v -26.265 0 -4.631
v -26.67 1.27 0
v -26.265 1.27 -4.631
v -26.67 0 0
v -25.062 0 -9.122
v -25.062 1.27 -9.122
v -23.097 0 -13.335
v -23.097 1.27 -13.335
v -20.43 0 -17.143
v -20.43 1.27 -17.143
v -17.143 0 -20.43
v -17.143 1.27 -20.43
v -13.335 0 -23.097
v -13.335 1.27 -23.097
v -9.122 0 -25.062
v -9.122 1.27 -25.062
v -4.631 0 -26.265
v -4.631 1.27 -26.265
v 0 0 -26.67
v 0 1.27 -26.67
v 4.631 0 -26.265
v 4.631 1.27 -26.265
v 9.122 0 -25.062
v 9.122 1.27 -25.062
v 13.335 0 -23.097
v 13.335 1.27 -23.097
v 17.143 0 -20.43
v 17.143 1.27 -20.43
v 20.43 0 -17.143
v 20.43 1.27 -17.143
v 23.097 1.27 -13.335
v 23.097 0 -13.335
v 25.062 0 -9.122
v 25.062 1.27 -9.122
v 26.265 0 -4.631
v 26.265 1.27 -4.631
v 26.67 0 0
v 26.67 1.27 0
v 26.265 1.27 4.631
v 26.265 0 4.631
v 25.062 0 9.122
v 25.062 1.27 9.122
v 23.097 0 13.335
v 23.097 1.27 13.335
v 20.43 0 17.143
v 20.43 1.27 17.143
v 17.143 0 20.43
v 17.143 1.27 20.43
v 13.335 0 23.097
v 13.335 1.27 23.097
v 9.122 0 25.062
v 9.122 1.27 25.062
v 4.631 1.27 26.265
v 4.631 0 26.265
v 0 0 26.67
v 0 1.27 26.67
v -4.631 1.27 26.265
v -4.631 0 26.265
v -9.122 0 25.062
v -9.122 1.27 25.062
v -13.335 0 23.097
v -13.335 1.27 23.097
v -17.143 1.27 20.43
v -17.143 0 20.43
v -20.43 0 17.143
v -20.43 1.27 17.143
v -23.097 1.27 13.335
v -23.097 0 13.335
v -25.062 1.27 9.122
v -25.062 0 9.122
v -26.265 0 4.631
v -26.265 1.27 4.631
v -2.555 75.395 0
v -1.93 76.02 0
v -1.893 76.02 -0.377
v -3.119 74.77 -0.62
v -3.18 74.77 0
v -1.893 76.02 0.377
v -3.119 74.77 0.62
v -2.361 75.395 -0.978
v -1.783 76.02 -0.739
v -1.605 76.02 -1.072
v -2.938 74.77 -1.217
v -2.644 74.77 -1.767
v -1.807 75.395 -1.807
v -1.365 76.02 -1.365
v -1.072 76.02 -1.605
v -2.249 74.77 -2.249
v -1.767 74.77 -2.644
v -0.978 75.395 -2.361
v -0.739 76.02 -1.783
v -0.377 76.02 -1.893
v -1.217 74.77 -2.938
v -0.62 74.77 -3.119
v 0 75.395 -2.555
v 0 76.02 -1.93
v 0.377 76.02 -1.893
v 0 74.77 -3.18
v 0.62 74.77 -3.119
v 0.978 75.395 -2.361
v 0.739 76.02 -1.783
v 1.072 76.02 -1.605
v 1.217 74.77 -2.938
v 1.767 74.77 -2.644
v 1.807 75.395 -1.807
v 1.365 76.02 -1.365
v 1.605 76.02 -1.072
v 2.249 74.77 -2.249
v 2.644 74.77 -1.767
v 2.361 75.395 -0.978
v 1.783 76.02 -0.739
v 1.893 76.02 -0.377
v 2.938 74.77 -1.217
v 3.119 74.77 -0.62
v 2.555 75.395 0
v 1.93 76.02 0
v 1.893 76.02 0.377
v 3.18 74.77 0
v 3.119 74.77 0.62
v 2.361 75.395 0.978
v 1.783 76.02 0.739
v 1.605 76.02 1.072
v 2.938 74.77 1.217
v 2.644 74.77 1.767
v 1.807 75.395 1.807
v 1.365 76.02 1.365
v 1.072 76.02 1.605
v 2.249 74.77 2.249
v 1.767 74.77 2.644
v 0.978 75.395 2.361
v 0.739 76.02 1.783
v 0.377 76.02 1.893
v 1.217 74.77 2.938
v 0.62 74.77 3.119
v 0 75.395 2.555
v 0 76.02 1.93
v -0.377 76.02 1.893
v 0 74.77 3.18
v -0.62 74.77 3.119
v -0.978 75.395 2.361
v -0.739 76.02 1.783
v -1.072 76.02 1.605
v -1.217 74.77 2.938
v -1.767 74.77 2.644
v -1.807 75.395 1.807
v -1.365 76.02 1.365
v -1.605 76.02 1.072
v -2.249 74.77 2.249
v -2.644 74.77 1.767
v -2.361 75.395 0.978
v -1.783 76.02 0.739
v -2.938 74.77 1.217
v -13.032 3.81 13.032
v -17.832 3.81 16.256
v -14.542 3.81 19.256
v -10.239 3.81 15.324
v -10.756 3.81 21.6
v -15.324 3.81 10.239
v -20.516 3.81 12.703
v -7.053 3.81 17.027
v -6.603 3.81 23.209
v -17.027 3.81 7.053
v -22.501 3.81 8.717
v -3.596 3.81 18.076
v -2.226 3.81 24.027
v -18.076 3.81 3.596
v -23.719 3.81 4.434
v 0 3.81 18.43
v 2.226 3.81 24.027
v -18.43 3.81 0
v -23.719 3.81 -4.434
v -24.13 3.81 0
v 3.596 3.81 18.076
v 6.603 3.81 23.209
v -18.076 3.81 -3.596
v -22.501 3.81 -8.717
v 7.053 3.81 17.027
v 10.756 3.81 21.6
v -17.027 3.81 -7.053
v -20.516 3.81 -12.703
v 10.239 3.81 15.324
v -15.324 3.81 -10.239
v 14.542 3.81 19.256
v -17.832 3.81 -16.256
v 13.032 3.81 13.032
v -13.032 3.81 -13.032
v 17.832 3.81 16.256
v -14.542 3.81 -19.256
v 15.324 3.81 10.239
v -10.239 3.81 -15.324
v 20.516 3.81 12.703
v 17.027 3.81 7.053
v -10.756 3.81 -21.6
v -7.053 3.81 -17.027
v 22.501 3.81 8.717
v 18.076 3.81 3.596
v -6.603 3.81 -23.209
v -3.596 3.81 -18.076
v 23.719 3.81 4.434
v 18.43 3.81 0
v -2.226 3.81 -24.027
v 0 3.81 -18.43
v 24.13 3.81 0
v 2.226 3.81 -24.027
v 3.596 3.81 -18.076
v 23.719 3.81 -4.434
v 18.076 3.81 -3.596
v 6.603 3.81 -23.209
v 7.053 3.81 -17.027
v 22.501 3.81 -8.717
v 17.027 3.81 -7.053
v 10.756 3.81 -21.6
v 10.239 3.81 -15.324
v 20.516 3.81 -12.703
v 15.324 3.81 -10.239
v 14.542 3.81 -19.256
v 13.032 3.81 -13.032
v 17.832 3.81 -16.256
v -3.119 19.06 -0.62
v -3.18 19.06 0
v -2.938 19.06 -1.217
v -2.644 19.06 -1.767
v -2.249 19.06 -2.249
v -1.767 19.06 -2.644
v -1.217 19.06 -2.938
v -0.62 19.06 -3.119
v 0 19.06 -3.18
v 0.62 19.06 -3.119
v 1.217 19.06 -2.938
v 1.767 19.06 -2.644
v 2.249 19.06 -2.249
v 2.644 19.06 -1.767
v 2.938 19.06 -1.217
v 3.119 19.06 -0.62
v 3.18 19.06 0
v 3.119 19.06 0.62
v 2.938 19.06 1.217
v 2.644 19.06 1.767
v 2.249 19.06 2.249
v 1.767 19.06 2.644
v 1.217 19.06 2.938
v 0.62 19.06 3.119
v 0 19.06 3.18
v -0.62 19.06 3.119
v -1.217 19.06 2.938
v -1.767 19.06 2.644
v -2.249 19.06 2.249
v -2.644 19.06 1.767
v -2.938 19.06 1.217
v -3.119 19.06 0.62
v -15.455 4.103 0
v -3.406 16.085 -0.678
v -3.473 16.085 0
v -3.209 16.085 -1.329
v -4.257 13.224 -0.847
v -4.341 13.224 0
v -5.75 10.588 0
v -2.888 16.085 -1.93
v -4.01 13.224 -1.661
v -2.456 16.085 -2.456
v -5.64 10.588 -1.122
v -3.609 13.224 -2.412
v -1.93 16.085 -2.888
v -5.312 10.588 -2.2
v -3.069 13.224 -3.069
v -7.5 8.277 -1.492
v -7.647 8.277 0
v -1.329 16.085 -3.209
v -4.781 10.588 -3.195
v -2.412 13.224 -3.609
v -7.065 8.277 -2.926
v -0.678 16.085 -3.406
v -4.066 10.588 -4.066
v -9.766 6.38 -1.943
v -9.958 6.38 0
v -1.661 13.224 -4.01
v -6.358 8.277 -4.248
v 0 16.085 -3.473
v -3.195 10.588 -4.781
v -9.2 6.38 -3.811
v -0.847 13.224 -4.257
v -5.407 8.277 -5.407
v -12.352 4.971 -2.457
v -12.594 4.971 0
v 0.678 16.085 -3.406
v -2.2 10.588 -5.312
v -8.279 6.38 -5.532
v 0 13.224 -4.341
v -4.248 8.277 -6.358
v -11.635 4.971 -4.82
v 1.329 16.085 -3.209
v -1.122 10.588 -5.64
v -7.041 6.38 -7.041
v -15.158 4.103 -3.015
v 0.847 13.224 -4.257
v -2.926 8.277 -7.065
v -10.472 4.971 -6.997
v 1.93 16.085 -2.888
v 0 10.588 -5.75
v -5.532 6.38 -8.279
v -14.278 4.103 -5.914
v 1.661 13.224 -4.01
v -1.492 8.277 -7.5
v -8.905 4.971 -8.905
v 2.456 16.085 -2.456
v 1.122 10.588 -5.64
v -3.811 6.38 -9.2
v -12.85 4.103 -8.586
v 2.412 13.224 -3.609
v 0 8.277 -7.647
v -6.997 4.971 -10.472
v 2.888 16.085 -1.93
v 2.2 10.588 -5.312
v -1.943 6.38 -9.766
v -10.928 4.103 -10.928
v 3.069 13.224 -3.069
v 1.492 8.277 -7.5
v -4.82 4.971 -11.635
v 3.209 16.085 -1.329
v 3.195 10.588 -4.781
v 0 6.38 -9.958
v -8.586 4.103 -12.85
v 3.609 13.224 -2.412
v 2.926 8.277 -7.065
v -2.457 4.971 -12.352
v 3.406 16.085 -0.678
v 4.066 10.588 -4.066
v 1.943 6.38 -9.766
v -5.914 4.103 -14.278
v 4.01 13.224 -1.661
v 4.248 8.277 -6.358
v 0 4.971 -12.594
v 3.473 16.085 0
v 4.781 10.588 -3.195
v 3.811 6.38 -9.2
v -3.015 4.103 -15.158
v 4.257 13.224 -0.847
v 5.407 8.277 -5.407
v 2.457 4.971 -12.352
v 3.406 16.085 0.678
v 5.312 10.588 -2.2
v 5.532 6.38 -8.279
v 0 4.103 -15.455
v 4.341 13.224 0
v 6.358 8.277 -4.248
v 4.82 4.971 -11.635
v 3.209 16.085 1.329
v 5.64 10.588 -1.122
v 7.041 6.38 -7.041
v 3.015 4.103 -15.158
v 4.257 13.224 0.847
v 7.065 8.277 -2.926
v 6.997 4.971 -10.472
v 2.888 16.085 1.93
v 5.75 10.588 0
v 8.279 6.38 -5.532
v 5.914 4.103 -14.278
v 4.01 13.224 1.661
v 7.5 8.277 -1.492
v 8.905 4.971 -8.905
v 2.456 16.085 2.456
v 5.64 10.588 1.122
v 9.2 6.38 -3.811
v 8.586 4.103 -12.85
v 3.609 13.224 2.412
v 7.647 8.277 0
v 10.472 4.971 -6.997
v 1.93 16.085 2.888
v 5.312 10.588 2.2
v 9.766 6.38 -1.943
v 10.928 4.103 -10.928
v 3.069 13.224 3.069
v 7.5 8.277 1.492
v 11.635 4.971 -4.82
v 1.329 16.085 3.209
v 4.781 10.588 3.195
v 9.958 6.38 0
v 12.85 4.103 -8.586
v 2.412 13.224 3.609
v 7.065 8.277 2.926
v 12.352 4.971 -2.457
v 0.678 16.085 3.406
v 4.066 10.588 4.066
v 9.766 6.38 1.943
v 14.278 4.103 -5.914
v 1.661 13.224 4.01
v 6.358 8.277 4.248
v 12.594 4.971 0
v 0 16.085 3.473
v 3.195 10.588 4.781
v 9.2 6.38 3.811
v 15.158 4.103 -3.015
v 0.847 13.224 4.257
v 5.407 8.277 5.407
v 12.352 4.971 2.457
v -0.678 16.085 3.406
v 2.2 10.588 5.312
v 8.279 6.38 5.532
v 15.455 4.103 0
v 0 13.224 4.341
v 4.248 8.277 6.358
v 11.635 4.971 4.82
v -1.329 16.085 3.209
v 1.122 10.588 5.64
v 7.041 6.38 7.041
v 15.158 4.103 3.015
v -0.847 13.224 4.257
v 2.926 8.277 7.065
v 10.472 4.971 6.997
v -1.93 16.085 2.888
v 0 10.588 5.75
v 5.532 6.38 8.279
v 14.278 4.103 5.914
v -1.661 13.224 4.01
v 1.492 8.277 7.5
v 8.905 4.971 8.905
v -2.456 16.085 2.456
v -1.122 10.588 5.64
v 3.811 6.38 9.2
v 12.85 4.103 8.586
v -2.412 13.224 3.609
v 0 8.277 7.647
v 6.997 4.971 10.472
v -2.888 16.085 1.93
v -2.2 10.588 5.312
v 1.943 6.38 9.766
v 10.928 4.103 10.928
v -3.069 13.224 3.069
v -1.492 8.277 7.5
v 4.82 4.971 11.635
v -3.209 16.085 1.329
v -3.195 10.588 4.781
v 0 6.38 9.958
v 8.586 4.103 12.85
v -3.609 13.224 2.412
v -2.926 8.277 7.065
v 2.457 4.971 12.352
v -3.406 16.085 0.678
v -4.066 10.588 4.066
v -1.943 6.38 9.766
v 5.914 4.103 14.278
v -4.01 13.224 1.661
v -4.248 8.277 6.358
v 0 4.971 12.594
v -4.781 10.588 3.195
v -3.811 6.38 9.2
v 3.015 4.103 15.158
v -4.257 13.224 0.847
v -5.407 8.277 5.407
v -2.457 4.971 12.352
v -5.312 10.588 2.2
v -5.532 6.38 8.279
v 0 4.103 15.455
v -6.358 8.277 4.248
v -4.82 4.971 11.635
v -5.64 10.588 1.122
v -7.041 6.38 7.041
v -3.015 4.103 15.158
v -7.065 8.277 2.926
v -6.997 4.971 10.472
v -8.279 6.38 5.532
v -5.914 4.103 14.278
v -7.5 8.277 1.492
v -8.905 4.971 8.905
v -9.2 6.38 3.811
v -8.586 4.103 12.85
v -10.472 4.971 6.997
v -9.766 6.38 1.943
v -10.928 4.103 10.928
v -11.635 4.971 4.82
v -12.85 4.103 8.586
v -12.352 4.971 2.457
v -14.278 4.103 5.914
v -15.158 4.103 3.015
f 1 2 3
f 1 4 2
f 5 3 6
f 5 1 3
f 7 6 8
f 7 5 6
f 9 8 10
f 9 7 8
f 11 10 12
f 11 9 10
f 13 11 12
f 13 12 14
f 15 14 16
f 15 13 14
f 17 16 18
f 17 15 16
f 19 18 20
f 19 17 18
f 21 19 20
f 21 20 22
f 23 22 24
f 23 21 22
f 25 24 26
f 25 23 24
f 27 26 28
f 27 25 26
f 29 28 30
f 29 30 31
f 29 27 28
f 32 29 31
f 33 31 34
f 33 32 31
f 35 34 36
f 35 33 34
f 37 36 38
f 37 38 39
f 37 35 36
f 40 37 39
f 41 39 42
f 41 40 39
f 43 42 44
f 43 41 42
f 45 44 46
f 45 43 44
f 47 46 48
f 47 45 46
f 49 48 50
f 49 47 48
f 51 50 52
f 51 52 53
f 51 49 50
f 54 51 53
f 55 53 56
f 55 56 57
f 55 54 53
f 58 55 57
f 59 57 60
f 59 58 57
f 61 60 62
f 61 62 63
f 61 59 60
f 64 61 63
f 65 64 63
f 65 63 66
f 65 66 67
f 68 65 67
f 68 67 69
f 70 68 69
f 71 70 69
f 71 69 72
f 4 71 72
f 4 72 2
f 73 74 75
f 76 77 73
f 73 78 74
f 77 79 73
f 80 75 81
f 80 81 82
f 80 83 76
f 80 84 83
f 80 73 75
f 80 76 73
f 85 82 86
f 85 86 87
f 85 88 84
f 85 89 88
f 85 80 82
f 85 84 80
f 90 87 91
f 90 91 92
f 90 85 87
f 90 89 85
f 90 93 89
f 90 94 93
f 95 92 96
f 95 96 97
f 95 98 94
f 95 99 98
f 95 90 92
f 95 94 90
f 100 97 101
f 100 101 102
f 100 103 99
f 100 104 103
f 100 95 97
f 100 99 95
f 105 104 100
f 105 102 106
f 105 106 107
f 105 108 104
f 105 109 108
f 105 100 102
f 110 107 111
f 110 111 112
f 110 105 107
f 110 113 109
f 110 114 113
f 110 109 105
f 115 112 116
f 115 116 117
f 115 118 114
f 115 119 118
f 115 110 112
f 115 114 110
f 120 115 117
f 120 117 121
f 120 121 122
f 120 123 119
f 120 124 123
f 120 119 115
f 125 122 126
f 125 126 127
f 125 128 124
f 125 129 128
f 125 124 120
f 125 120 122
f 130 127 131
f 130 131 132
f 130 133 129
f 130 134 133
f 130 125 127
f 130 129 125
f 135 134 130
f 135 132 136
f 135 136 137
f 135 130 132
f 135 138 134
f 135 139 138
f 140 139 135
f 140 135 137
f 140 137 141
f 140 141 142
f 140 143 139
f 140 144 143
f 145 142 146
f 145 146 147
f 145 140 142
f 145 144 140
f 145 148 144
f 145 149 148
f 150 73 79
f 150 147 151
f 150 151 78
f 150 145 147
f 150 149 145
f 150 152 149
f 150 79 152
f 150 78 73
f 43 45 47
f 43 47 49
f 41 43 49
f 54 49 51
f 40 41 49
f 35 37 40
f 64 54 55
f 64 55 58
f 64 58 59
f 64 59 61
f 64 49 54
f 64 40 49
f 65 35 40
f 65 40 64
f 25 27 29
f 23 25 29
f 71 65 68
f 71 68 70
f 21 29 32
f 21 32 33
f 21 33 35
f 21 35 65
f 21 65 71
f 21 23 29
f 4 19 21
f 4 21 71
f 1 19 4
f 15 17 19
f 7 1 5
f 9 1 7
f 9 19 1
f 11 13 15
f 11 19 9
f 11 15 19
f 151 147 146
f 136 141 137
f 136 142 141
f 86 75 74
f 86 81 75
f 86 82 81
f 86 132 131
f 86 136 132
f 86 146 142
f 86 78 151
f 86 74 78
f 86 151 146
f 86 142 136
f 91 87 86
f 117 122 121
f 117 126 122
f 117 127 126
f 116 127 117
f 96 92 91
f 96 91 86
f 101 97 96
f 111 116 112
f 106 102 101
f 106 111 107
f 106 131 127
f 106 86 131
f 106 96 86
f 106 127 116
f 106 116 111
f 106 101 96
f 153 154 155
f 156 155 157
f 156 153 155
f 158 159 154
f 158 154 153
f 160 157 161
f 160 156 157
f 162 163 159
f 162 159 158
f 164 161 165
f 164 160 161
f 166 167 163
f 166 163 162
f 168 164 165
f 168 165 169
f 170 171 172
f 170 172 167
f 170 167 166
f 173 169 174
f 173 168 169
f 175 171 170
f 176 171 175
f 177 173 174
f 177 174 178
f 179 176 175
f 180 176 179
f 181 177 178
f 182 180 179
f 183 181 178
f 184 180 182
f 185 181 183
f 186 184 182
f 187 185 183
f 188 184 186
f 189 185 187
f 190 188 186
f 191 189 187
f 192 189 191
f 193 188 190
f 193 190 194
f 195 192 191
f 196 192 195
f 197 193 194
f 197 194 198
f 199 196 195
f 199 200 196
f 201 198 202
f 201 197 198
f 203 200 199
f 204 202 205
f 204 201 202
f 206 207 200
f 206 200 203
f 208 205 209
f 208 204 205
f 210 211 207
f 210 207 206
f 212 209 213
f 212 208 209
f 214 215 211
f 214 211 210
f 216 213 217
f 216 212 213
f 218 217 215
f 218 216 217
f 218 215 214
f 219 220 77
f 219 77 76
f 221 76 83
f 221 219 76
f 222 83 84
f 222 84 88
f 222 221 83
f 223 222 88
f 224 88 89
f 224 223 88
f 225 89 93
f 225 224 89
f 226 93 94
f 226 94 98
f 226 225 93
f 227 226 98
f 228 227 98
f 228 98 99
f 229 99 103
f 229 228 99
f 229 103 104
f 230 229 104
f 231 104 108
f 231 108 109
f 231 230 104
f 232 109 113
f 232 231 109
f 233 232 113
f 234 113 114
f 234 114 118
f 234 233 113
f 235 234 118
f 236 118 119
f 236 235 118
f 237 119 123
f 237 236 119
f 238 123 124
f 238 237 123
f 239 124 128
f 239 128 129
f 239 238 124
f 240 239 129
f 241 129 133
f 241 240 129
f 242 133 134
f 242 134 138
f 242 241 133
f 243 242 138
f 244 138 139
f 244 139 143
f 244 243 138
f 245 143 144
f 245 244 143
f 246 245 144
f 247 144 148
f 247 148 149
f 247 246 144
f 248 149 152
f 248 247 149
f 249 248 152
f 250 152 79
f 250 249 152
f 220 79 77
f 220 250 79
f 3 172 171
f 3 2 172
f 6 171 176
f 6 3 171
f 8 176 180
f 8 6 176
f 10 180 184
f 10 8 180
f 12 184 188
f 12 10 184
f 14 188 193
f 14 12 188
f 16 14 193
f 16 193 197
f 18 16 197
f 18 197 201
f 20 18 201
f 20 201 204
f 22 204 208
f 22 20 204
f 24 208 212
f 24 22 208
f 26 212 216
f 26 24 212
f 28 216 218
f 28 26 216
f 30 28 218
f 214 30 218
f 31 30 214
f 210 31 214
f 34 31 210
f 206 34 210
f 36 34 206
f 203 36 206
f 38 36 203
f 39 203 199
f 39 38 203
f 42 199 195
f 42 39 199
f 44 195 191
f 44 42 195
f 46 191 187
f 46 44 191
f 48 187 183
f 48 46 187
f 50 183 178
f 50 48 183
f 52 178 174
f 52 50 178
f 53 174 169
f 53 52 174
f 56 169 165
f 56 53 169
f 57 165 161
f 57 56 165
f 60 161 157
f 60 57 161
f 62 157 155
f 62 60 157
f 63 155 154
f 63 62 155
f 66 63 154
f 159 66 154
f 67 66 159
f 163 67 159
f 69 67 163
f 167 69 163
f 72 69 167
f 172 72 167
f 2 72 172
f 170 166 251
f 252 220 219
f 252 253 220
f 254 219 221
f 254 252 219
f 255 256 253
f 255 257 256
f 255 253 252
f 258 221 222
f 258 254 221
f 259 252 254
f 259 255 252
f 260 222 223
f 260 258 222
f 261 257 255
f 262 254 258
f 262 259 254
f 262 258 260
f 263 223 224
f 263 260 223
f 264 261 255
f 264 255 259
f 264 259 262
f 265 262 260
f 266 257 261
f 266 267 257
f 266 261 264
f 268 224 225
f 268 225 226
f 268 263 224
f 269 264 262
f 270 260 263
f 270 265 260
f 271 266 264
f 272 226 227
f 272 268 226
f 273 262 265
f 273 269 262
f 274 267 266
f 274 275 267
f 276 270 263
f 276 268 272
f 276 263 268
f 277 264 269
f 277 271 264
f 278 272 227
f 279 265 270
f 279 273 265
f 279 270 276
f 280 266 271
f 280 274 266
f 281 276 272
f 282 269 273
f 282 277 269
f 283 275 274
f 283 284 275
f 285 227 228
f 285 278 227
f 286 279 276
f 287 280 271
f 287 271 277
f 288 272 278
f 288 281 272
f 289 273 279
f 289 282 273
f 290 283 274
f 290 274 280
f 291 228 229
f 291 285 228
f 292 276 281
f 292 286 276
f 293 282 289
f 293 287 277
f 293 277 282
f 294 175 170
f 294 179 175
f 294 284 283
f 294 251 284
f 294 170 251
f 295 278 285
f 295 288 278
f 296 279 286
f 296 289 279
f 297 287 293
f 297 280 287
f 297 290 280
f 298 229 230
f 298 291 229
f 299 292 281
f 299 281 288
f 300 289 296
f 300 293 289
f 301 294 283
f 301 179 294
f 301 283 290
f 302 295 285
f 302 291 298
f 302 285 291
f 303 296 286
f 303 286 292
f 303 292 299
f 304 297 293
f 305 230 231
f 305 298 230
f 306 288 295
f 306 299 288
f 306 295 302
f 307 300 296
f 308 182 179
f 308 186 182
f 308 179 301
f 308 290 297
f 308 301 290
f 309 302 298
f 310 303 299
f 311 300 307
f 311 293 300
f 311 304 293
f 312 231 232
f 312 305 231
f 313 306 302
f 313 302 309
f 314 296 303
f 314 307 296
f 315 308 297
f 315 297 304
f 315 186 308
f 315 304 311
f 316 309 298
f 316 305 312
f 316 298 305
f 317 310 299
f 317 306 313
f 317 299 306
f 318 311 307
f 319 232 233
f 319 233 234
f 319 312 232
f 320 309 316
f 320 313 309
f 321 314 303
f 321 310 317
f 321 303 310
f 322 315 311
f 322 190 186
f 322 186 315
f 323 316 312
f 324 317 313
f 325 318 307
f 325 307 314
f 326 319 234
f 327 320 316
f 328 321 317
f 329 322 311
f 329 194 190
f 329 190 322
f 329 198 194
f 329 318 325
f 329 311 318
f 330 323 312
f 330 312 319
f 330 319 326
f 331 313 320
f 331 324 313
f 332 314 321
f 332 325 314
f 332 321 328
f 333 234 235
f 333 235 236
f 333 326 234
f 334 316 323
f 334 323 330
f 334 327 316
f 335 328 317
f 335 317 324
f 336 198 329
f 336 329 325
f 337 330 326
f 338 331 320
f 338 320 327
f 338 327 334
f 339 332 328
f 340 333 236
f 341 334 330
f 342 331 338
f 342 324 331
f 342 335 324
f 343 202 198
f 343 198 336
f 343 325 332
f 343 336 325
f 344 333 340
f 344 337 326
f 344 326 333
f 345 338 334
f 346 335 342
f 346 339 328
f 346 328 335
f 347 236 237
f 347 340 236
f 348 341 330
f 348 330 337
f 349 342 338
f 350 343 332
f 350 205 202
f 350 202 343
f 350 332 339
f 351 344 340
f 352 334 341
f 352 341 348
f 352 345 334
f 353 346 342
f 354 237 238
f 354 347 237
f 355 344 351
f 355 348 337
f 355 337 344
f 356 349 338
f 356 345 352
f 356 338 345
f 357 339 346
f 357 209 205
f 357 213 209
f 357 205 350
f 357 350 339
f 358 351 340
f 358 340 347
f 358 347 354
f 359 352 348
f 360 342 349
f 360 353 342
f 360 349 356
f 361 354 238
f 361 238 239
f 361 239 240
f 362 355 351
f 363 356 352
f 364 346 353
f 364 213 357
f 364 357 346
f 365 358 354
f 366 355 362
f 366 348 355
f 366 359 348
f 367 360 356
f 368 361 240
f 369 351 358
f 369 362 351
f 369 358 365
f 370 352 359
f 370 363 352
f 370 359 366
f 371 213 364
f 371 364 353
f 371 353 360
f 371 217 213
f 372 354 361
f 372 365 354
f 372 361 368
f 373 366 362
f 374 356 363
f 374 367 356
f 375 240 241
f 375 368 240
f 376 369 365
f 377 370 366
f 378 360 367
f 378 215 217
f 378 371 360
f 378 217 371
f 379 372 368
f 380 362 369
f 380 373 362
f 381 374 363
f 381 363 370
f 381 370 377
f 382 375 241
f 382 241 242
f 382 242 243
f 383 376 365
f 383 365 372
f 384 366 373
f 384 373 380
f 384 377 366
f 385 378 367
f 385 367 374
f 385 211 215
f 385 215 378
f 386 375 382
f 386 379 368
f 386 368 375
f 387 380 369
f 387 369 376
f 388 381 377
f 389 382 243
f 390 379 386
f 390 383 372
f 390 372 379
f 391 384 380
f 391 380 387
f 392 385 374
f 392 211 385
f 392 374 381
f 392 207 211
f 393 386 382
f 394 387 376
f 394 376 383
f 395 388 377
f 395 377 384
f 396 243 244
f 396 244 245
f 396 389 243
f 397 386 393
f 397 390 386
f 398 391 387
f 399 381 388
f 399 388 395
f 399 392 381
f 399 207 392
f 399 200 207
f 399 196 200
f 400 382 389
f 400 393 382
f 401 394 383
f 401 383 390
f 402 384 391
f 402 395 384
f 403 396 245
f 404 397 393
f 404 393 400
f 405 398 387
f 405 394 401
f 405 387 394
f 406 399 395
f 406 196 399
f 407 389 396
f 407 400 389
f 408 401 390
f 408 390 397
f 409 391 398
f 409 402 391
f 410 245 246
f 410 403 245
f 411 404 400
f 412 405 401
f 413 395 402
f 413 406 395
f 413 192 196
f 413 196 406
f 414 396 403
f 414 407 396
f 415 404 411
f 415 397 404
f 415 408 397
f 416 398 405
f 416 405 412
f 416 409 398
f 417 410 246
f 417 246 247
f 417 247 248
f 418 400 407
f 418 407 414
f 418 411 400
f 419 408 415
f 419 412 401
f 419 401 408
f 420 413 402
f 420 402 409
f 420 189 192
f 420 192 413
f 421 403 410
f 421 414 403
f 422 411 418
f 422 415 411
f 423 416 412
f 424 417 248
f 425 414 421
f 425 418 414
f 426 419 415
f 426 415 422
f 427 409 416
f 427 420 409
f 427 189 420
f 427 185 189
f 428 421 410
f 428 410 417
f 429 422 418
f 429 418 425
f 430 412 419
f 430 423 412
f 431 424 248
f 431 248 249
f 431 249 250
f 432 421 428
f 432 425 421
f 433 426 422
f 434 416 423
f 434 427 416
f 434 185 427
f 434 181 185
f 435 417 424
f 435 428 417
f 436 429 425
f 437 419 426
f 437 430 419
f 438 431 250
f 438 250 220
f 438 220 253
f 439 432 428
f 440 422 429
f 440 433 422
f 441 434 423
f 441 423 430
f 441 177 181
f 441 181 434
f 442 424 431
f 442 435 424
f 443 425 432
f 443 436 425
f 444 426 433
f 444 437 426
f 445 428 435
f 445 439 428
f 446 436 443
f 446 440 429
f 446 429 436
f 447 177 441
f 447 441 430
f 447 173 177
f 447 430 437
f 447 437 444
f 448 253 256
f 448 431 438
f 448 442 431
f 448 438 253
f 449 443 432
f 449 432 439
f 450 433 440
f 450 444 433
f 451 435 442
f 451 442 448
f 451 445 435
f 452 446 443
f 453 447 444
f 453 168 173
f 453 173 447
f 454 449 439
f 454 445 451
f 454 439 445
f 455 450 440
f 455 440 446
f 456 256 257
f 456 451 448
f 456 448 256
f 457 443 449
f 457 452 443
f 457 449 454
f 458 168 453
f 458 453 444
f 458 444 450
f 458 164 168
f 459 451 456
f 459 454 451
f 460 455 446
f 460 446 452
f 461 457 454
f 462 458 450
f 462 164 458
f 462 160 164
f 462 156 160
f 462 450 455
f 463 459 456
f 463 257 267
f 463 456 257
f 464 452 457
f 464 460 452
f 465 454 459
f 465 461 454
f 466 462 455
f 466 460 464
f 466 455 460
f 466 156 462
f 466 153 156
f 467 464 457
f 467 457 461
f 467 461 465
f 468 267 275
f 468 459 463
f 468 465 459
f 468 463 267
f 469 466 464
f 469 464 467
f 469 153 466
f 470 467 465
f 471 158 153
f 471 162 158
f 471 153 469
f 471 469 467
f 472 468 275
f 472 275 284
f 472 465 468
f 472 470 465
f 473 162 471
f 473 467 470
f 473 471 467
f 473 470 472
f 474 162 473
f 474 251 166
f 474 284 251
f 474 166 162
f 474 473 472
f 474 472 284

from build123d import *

# Parameters (mm, degrees)
CHAMFER1_SIZE = 1.25


with BuildPart() as part:
    # Sketch1 → Revolve1 (revolve)
    with BuildSketch(Plane.XY, mode=Mode.PRIVATE) as revolve1_sk:
        with BuildLine():
            Line((24.13, 3.81), (26.67, 1.27))
            Line((26.67, 1.27), (26.67, 0))
            Line((26.67, 0), (0, 0))
            Line((0, 0), (0, 76.02))
            Line((0, 76.02), (3.18, 76.02))
            Line((3.18, 76.02), (3.18, 19.06))
            ThreePointArc((3.18, 19.06), (7.646621587, 8.276621587), (18.43, 3.81))
            Line((18.43, 3.81), (24.13, 3.81))
        make_face()
    revolve(revolve1_sk.sketch.rotate(Axis((0, 76.02, 0), (0, -1, 0)), 180), axis=Axis((0, 76.02, 0), (0, -1, 0)))

    # Chamfer1
    chamfer1_edges = [part.edges().sort_by_distance(p)[0] for p in [
        (3.18, 76.02, 0),
    ]]
    chamfer(chamfer1_edges, length=CHAMFER1_SIZE)


solid = part.part
